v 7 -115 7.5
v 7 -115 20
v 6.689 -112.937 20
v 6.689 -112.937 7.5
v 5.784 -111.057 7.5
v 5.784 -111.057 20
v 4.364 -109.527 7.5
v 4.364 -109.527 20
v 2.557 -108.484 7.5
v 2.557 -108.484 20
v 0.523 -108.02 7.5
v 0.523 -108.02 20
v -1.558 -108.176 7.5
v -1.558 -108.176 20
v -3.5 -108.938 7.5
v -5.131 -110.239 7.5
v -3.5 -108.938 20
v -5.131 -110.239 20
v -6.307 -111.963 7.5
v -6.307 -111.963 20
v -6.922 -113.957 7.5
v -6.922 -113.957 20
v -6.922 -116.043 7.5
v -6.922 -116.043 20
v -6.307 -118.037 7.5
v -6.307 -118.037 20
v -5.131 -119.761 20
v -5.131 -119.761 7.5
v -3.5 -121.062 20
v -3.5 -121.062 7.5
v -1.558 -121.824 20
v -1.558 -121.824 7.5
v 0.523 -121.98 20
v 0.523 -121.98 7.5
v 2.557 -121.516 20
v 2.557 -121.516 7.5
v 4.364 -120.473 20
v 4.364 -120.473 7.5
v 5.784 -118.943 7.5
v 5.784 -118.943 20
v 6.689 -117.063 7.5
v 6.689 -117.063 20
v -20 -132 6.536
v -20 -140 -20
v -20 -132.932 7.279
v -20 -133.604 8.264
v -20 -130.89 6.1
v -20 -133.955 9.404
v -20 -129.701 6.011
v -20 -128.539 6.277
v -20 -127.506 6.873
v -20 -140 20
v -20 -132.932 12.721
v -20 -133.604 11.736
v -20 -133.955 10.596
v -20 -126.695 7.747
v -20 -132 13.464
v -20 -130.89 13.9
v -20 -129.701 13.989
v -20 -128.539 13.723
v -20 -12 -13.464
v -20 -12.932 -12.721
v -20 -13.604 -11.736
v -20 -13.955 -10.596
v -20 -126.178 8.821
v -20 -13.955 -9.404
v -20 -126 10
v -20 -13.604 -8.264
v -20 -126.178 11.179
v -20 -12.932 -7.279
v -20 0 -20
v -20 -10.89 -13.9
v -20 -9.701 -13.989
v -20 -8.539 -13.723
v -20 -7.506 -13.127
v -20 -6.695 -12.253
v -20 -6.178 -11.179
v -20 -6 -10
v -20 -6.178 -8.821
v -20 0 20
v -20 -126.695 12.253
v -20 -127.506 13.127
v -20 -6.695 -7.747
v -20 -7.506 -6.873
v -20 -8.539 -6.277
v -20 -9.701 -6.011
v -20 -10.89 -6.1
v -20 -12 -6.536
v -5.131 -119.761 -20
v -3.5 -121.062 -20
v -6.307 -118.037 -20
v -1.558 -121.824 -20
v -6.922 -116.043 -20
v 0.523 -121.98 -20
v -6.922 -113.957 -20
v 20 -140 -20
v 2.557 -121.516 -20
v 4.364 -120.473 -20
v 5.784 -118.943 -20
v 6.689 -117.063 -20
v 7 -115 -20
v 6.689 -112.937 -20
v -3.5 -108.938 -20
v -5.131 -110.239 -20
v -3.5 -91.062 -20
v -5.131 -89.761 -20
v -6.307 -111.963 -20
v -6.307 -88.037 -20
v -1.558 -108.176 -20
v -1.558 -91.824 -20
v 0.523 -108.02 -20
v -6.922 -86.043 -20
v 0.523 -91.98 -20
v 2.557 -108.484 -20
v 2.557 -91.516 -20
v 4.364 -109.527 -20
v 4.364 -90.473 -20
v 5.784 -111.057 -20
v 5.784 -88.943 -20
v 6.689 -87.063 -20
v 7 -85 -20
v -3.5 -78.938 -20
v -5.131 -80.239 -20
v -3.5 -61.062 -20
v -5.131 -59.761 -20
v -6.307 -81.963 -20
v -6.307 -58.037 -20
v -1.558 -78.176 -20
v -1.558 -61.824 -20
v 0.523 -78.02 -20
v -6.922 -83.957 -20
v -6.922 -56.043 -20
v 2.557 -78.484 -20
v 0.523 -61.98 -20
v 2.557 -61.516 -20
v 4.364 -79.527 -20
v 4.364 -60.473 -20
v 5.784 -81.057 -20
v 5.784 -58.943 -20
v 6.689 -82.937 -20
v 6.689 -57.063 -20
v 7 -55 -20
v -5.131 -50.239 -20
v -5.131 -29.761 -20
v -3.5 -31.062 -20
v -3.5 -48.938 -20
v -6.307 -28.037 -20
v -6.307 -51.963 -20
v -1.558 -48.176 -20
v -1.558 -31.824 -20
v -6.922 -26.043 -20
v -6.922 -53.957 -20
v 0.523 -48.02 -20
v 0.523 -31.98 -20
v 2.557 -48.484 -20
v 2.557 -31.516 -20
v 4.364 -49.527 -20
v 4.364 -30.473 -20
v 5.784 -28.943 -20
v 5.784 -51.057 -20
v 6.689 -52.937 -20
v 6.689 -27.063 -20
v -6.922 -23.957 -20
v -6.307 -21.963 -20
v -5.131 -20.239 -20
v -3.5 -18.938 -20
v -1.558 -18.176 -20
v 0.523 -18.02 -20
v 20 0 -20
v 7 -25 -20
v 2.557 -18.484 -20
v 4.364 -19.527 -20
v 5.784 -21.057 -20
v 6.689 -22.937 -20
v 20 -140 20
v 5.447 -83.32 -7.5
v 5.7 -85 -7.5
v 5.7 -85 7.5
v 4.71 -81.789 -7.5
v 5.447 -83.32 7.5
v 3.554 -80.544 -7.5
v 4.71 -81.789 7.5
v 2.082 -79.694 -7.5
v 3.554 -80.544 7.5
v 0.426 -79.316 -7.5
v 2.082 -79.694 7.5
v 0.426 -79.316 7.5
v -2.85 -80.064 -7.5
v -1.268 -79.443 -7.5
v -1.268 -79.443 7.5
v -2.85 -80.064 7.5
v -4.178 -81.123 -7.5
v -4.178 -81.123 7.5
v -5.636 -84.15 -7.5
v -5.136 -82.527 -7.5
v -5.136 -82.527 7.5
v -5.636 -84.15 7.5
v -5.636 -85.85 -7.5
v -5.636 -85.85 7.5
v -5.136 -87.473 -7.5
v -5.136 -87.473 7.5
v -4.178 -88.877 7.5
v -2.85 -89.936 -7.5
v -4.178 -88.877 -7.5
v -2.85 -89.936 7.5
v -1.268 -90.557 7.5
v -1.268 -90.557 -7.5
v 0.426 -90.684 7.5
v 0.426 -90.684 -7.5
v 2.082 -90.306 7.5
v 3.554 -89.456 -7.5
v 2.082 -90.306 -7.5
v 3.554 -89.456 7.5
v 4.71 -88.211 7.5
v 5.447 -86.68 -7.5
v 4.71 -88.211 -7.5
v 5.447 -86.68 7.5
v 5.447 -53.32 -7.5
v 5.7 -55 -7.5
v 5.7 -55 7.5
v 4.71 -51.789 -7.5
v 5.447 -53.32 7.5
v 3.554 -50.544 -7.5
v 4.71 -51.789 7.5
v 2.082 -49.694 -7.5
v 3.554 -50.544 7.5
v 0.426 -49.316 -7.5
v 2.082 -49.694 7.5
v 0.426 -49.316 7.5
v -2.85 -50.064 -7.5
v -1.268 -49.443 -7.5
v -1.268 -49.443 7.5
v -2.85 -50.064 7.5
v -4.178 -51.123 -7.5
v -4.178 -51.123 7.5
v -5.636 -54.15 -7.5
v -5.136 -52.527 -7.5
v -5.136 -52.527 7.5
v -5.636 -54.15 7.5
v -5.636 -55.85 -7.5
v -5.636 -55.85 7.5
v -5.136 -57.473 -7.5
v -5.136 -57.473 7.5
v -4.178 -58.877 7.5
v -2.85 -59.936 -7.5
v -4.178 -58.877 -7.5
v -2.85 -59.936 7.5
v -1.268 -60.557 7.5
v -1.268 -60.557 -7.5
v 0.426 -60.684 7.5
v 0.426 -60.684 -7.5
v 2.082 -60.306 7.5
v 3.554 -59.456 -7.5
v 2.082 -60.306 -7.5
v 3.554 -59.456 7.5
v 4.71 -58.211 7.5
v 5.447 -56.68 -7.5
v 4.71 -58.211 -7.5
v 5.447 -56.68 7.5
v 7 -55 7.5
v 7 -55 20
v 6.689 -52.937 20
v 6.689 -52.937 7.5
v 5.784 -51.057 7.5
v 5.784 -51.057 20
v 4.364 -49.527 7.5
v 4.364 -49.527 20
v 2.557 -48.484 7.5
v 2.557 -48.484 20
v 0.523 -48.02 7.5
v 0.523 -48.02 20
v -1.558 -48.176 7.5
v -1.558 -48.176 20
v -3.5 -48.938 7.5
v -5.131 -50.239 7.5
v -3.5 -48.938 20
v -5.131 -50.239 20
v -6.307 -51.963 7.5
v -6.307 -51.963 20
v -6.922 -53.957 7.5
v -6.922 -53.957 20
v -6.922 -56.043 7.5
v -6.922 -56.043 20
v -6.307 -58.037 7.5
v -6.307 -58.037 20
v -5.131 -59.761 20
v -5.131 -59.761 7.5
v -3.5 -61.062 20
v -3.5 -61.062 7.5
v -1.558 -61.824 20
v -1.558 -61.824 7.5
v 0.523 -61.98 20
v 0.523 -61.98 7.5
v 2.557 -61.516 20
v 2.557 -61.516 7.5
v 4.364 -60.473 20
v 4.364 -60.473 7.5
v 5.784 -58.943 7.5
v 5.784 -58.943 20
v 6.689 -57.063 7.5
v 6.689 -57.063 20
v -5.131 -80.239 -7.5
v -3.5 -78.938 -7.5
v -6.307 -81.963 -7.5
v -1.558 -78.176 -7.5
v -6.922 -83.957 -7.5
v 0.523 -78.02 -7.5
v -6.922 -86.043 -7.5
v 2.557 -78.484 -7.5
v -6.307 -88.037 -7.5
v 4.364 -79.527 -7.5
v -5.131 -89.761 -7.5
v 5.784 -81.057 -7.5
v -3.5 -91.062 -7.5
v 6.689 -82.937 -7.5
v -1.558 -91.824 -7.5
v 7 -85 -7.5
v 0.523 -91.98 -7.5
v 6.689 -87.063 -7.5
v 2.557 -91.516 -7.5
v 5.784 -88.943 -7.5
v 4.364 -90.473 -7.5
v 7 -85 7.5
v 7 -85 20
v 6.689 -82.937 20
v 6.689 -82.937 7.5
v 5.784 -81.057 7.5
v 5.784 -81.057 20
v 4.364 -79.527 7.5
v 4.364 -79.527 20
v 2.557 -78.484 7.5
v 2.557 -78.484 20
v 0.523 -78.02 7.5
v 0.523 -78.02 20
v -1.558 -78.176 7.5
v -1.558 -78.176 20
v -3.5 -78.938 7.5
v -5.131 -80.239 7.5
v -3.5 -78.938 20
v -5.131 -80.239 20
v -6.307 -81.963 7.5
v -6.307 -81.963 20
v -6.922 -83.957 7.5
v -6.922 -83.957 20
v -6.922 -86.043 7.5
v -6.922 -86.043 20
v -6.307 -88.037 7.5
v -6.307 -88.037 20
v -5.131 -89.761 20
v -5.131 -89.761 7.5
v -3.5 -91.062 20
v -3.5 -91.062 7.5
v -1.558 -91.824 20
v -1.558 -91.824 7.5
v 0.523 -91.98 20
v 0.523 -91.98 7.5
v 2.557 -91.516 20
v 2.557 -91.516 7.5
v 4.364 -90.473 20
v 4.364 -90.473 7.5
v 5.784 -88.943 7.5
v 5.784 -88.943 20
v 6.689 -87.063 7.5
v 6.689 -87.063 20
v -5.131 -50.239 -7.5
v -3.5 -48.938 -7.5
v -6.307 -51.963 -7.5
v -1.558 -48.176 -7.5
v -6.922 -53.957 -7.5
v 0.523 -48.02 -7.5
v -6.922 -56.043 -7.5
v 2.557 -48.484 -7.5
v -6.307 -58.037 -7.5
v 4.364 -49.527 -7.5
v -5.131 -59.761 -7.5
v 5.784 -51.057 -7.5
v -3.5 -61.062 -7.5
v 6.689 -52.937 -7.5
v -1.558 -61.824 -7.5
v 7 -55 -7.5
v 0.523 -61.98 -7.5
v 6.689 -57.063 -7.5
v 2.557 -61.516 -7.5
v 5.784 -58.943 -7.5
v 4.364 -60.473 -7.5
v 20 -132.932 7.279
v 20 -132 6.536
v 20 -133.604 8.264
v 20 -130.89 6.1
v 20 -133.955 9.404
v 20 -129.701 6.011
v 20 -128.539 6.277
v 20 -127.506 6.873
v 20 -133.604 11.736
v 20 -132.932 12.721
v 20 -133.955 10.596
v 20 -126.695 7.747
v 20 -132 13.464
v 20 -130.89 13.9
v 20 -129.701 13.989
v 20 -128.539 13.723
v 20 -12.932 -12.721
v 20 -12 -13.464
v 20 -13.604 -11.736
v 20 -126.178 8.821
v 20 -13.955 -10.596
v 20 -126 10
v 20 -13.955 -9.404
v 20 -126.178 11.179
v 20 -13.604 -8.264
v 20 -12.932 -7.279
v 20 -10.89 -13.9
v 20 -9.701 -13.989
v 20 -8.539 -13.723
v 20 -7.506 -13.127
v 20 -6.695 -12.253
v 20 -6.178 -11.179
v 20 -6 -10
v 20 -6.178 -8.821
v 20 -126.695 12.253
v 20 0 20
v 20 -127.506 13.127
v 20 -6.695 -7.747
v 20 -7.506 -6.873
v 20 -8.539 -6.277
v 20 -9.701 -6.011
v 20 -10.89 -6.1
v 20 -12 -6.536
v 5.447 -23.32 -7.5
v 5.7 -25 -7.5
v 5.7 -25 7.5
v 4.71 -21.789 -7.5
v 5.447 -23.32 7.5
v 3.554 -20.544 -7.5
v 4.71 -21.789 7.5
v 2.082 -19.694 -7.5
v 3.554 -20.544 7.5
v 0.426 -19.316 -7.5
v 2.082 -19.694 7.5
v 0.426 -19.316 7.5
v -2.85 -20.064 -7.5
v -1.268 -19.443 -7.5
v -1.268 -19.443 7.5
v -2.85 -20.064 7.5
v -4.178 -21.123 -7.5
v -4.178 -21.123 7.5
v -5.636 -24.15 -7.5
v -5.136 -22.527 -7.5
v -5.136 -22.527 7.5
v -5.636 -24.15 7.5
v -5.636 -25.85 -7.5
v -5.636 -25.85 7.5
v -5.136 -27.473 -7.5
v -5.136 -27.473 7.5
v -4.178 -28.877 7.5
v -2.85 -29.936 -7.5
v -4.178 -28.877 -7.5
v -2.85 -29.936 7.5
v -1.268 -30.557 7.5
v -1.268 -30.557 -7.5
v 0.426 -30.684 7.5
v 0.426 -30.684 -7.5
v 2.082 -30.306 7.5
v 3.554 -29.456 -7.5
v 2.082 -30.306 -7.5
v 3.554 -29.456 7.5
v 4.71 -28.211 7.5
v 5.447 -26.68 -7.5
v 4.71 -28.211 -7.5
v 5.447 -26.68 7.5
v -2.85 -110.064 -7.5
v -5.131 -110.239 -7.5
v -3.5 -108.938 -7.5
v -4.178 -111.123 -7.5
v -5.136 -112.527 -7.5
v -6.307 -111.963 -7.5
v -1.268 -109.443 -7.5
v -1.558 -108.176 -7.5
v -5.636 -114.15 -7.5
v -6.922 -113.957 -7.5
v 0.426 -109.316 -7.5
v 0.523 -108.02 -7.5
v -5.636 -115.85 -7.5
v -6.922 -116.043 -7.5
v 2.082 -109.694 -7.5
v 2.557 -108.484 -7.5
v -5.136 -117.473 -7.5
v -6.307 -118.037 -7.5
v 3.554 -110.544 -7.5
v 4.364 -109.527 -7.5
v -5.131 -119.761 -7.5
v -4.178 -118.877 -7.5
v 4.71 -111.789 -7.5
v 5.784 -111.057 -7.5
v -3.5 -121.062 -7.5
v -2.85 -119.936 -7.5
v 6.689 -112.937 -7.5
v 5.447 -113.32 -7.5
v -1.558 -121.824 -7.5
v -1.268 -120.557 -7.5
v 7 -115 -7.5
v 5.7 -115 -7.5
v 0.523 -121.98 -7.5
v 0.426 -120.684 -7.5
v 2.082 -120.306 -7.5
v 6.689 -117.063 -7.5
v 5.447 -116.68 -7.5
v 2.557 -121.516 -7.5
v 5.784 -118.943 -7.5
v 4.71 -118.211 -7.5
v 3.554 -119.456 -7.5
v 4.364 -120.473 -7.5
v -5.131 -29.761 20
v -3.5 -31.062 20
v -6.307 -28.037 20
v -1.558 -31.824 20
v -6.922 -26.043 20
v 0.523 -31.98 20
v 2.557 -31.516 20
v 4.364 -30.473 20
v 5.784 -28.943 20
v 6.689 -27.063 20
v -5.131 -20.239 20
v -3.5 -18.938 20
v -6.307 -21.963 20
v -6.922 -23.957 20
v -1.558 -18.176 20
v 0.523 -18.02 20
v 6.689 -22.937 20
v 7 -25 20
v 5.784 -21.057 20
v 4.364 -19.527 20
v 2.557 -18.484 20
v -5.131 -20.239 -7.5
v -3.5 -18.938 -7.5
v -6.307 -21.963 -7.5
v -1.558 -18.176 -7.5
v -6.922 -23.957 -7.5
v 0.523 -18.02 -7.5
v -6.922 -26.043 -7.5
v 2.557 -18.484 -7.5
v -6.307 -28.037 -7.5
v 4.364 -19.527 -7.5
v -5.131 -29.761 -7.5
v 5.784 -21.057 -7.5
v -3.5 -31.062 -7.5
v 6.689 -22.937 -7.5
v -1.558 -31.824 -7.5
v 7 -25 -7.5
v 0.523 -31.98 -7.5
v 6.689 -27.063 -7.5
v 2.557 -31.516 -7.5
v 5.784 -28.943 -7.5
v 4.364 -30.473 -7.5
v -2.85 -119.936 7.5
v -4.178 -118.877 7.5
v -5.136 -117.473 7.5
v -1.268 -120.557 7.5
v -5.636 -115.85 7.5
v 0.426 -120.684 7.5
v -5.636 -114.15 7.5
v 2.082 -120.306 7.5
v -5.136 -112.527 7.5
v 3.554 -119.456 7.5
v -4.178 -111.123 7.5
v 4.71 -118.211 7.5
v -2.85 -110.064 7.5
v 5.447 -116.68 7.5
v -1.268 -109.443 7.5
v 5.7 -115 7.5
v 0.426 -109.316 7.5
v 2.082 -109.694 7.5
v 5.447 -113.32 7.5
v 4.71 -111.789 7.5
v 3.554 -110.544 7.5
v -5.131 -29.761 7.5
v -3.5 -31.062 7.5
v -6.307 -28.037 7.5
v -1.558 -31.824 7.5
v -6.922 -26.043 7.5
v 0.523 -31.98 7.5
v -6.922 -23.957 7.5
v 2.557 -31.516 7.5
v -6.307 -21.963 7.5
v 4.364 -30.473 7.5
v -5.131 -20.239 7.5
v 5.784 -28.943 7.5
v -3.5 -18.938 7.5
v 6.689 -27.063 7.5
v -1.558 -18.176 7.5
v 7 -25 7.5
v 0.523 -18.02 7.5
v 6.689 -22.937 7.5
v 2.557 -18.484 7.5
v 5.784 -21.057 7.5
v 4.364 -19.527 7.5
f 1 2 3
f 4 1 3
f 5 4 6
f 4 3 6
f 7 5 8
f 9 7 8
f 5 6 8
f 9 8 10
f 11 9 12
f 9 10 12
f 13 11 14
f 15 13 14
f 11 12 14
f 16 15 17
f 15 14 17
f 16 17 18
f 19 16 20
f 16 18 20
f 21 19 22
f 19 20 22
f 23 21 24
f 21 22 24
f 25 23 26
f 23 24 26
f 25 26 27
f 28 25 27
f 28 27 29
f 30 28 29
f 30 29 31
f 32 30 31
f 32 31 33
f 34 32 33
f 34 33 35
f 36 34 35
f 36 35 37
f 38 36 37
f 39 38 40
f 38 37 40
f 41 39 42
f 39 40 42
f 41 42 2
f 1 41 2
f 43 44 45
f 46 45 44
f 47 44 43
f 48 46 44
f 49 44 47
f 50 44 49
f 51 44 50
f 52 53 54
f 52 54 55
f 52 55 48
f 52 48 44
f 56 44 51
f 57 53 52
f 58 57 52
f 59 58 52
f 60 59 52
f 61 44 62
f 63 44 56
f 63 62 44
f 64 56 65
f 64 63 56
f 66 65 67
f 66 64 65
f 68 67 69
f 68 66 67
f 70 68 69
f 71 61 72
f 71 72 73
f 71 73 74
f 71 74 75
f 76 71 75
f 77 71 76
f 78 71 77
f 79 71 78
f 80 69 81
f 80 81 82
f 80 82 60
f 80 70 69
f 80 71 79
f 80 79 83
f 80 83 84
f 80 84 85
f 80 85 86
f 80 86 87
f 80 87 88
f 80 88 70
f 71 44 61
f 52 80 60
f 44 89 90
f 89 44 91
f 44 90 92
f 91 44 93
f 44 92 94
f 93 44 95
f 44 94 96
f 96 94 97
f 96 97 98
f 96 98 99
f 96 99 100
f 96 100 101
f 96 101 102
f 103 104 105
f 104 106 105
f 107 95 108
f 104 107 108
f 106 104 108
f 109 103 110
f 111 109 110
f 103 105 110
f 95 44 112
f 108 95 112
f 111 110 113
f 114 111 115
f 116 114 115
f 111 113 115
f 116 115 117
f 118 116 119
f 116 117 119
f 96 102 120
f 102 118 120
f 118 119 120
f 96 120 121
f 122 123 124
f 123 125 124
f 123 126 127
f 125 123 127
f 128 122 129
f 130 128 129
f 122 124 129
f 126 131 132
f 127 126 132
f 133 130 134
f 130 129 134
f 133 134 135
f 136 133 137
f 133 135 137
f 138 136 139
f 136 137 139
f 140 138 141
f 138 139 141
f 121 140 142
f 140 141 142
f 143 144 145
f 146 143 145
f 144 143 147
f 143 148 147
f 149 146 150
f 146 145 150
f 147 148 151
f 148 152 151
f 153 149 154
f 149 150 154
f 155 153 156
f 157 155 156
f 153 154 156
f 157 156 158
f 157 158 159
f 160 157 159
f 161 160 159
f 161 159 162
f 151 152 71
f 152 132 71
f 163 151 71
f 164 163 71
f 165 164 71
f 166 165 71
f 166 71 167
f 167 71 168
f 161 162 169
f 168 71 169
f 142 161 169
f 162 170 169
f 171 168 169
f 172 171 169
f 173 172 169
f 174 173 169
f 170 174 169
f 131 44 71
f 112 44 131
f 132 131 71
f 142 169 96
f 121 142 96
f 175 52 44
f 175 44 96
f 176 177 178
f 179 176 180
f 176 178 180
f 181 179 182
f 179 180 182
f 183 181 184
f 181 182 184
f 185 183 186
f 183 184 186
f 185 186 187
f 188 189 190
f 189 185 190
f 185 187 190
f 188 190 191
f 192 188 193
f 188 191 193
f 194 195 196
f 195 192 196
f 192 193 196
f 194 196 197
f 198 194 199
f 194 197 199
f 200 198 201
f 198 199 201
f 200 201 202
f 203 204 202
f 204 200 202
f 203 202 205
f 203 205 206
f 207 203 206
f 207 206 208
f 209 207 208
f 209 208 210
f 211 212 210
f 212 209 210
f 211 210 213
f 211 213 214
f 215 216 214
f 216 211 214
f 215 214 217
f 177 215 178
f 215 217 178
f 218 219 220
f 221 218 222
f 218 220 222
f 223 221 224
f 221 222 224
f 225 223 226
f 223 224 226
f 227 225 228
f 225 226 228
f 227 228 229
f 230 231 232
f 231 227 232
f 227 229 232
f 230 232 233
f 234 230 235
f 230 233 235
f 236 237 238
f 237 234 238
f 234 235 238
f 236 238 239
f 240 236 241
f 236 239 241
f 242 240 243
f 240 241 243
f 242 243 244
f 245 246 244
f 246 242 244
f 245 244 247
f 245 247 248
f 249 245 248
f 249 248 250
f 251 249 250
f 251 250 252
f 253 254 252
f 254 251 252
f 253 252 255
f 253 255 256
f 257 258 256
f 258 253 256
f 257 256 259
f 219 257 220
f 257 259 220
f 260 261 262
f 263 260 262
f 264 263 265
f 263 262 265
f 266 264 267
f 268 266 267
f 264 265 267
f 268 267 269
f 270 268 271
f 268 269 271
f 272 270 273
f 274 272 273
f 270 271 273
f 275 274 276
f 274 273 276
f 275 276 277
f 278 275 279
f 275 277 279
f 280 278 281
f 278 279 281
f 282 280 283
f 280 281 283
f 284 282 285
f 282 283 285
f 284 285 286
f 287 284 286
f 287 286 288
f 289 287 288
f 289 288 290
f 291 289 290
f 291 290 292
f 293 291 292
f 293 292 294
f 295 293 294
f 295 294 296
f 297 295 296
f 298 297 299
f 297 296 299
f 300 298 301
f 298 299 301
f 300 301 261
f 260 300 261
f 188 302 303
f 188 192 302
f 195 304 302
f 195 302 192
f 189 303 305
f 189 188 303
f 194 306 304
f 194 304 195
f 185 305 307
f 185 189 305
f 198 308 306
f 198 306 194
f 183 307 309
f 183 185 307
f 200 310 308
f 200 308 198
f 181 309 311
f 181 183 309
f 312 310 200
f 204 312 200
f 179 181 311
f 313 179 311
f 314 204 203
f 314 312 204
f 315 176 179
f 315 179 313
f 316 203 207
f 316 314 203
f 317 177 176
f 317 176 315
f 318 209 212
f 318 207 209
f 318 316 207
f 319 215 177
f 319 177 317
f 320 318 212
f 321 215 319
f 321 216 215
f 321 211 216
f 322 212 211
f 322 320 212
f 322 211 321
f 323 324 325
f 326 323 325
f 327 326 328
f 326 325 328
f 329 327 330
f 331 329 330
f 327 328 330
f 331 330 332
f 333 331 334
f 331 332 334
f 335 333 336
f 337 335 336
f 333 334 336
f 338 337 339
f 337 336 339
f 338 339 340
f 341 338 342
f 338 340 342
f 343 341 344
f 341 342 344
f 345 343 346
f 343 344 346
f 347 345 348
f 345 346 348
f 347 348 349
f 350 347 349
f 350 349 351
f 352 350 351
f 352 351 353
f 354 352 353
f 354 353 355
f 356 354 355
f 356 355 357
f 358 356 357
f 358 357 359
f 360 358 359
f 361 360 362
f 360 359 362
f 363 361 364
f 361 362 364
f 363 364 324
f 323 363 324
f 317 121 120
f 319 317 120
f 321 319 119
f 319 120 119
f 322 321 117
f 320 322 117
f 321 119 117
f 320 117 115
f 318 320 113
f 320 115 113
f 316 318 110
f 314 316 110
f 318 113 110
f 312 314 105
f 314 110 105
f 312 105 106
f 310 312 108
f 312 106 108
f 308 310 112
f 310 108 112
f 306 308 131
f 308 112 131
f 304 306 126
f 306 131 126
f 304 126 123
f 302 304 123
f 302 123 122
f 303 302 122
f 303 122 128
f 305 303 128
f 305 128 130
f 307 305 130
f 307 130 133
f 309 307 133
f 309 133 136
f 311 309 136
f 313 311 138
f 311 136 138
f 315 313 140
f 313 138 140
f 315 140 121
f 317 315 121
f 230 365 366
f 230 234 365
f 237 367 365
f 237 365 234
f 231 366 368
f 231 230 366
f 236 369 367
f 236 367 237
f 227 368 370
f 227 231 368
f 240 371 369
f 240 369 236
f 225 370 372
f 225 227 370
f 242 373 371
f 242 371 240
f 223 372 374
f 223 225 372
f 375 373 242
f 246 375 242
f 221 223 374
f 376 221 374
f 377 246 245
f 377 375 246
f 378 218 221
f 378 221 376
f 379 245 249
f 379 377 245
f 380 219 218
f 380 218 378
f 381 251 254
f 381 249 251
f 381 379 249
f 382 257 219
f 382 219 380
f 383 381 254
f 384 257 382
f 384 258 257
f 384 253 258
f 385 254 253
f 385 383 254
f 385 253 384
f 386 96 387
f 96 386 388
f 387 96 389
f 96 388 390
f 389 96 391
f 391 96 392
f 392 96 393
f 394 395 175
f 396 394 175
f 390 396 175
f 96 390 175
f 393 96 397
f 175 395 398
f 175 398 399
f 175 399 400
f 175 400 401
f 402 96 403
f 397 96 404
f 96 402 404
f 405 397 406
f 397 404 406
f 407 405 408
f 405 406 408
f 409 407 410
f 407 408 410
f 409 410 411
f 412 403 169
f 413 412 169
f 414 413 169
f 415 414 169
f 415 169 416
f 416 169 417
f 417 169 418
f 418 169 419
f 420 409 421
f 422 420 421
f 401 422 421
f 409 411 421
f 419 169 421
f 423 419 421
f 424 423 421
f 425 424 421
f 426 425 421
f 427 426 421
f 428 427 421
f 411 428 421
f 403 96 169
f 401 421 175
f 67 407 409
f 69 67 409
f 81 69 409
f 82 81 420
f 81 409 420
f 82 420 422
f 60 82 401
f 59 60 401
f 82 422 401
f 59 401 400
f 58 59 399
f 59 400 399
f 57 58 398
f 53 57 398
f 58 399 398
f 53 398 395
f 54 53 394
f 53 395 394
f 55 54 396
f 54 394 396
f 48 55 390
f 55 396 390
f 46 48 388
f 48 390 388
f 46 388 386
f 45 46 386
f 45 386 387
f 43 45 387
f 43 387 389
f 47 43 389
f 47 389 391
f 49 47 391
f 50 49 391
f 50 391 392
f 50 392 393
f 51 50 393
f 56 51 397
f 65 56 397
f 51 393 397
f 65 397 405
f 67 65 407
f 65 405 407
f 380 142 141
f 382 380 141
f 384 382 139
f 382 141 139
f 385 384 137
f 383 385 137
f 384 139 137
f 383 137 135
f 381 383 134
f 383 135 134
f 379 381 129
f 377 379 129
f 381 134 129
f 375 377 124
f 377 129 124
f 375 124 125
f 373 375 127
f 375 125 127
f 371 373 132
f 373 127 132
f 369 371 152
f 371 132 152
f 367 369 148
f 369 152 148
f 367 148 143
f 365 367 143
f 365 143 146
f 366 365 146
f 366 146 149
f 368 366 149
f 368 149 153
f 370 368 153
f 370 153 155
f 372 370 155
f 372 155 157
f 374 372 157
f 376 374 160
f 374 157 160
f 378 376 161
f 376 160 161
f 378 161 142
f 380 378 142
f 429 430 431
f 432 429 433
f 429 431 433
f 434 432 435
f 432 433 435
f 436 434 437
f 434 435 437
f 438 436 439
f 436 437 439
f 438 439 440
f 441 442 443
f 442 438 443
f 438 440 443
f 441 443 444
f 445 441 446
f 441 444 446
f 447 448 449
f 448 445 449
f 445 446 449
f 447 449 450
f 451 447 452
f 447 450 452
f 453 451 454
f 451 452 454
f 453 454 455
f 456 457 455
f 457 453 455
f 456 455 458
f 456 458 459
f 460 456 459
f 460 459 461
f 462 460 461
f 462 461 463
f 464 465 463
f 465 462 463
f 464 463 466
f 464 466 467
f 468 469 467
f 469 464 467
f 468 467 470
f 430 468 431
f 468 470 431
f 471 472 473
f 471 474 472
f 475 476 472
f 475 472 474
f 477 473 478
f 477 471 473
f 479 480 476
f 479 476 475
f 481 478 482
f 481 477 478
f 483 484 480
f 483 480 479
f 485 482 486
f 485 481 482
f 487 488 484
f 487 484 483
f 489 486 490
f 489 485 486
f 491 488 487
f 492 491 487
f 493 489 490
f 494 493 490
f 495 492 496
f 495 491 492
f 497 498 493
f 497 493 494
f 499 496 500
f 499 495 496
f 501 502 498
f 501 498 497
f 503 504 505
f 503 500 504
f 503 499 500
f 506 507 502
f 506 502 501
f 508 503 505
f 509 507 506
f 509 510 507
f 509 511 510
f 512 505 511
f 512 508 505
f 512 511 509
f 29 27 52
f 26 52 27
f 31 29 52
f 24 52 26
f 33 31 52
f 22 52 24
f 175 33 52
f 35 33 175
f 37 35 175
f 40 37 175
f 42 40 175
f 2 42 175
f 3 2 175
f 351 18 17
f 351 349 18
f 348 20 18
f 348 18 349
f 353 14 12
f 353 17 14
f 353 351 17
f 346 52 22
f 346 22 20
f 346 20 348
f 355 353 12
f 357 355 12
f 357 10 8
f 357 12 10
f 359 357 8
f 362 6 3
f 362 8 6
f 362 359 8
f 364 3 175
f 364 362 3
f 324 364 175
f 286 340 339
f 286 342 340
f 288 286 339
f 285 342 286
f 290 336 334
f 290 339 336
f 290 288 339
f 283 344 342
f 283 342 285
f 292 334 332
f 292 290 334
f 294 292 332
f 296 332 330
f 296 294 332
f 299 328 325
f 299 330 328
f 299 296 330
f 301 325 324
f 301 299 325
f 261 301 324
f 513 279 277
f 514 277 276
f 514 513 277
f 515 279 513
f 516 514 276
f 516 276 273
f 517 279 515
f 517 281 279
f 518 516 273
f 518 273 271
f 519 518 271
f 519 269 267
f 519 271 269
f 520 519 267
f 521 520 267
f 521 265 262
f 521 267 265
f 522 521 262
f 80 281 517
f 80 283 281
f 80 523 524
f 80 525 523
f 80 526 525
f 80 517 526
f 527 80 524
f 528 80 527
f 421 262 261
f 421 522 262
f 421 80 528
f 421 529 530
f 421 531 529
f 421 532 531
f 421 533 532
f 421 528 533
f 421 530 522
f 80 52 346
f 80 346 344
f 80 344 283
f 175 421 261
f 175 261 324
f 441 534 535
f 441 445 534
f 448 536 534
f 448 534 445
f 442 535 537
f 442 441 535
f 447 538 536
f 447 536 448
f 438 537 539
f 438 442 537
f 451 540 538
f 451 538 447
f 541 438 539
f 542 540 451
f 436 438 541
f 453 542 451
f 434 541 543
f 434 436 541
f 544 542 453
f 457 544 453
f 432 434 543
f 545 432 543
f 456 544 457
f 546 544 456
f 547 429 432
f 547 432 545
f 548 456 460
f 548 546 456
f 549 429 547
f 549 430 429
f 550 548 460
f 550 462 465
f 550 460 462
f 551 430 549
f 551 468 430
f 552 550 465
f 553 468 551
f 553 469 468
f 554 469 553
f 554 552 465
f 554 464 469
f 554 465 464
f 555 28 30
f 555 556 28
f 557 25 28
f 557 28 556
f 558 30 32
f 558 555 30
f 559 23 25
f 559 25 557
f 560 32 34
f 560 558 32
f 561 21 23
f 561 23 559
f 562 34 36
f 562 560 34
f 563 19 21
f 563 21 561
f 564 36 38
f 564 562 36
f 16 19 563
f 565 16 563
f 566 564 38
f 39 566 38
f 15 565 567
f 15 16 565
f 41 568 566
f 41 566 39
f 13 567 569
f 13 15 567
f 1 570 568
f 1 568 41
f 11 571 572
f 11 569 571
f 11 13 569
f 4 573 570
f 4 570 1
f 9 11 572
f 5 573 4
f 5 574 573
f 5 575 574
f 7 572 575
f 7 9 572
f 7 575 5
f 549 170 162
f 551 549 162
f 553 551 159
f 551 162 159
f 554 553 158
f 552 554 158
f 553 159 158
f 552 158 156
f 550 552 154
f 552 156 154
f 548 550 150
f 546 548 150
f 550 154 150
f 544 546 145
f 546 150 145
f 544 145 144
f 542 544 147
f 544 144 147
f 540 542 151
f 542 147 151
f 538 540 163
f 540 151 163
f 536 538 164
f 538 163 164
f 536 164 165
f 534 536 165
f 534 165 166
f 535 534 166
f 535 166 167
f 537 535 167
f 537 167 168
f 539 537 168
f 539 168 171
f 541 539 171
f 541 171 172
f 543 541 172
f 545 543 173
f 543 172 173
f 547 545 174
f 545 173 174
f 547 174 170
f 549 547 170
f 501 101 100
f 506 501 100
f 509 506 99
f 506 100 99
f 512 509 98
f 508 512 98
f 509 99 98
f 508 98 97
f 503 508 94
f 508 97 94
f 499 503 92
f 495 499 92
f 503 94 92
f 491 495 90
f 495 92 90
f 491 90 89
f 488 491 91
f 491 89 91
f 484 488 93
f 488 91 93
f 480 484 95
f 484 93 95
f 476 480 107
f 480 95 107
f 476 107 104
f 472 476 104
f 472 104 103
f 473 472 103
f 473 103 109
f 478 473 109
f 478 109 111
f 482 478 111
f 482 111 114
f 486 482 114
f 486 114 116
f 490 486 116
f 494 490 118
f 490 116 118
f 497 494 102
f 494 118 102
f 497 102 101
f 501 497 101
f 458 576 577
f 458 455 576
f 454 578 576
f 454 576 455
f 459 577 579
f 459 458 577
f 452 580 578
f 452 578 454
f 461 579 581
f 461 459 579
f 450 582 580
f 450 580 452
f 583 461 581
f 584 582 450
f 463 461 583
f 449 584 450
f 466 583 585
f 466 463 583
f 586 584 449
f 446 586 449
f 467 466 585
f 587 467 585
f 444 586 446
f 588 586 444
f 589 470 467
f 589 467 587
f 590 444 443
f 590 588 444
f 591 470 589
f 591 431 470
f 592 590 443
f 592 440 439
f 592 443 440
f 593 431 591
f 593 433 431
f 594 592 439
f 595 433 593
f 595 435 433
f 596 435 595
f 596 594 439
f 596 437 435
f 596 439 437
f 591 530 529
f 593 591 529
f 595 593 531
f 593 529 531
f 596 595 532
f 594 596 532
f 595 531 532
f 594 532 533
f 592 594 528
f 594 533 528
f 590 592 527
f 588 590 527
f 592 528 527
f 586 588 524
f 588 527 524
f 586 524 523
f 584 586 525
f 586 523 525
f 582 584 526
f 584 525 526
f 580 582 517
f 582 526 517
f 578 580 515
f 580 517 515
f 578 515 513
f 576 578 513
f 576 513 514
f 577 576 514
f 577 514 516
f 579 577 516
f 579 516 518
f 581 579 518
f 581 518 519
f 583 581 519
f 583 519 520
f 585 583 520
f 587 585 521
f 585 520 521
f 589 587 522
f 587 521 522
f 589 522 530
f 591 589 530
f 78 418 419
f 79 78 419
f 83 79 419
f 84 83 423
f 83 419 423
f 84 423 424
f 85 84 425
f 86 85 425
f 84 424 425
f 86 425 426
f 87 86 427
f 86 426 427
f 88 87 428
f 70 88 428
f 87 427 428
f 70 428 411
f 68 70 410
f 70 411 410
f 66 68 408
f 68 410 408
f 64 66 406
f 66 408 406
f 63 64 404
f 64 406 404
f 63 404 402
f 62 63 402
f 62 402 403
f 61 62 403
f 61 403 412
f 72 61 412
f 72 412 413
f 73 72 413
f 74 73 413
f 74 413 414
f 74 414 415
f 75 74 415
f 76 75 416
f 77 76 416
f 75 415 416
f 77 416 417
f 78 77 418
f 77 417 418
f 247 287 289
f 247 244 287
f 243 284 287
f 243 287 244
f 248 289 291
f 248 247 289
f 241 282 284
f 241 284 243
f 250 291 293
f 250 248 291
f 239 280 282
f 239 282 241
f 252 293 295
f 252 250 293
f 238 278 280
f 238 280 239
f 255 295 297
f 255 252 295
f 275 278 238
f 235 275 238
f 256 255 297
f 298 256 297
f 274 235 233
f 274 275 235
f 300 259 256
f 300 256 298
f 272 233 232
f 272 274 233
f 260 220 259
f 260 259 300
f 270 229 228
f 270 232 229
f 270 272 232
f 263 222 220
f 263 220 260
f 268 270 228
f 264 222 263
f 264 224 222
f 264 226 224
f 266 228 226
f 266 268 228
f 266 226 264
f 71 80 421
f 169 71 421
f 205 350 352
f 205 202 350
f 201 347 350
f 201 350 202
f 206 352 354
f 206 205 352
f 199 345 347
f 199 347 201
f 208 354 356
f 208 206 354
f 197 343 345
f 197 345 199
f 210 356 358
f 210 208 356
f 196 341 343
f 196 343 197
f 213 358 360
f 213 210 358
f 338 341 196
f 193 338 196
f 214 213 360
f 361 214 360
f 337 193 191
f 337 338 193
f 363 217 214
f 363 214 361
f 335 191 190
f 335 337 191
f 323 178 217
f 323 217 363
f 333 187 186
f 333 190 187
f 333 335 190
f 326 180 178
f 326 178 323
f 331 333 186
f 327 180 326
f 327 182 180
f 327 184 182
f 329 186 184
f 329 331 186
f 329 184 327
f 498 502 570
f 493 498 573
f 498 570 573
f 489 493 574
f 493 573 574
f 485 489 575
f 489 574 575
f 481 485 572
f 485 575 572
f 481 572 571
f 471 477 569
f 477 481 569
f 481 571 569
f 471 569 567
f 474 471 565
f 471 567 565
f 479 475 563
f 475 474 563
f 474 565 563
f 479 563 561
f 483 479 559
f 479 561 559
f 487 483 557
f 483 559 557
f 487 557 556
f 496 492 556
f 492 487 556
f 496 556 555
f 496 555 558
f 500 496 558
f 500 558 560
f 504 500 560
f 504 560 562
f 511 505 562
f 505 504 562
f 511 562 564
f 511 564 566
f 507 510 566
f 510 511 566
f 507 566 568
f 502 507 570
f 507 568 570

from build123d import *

# Parameters (mm, degrees)
F0_W     = 40
F0_H     = 40
F1_DEPTH = 140
F2_R     = 5.7
F3_DEPTH = 40
F4_R     = 4
F5_DEPTH = 40
F6_R     = 7
F6_R_2   = 5.7
F7_DEPTH = 12.5
F8_R     = 7
F8_R_2   = 5.7
F9_DEPTH = 12.5


with BuildPart() as f1:
    # F0 (on Front) → F1 (new body)
    with BuildSketch(Plane.XZ):
        Rectangle(F0_W, F0_H)
    extrude(amount=F1_DEPTH)

    # F2 (on face) → F3 (cut)
    with BuildSketch(Plane.XY.offset(20)):
        with Locations((0, -55)):
            Circle(F2_R)
        with Locations((0, -85)):
            Circle(F2_R)
        with Locations((0, -115)):
            Circle(F2_R)
        with Locations((0, -25)):
            Circle(F2_R)
    extrude(amount=-F3_DEPTH, mode=Mode.SUBTRACT)

    # F4 (on face) → F5 (cut)
    with BuildSketch(Plane.YZ.offset(20)):
        with Locations((-130, 10)):
            Circle(F4_R)
        with Locations((-10, -10)):
            Circle(F4_R)
    extrude(amount=-F5_DEPTH, mode=Mode.SUBTRACT)

    # F6 (on face) → F7 (cut)
    with BuildSketch(Plane(origin=(0, 0, -20), x_dir=(1, 0, 0), z_dir=(0, 0, -1))):
        with Locations((0, 115)):
            Circle(F6_R)
        with Locations((0, 115)):
            Circle(F6_R_2, mode=Mode.SUBTRACT)
        with Locations((0, 85)):
            Circle(F6_R)
        with Locations((0, 85)):
            Circle(F6_R_2, mode=Mode.SUBTRACT)
        with Locations((0, 55)):
            Circle(F6_R)
        with Locations((0, 55)):
            Circle(F6_R_2, mode=Mode.SUBTRACT)
        with Locations((0, 25)):
            Circle(F6_R)
        with Locations((0, 25)):
            Circle(F6_R_2, mode=Mode.SUBTRACT)
    extrude(amount=-F7_DEPTH, mode=Mode.SUBTRACT)

    # F8 (on face) → F9 (cut)
    with BuildSketch(Plane.XY.offset(20)):
        with Locations((0, -25)):
            Circle(F8_R)
        with Locations((0, -25)):
            Circle(F8_R_2, mode=Mode.SUBTRACT)
        with Locations((0, -55)):
            Circle(F8_R)
        with Locations((0, -55)):
            Circle(F8_R_2, mode=Mode.SUBTRACT)
        with Locations((0, -85)):
            Circle(F8_R)
        with Locations((0, -85)):
            Circle(F8_R_2, mode=Mode.SUBTRACT)
        with Locations((0, -115)):
            Circle(F8_R)
        with Locations((0, -115)):
            Circle(F8_R_2, mode=Mode.SUBTRACT)
    extrude(amount=-F9_DEPTH, mode=Mode.SUBTRACT)


solid = f1.part
